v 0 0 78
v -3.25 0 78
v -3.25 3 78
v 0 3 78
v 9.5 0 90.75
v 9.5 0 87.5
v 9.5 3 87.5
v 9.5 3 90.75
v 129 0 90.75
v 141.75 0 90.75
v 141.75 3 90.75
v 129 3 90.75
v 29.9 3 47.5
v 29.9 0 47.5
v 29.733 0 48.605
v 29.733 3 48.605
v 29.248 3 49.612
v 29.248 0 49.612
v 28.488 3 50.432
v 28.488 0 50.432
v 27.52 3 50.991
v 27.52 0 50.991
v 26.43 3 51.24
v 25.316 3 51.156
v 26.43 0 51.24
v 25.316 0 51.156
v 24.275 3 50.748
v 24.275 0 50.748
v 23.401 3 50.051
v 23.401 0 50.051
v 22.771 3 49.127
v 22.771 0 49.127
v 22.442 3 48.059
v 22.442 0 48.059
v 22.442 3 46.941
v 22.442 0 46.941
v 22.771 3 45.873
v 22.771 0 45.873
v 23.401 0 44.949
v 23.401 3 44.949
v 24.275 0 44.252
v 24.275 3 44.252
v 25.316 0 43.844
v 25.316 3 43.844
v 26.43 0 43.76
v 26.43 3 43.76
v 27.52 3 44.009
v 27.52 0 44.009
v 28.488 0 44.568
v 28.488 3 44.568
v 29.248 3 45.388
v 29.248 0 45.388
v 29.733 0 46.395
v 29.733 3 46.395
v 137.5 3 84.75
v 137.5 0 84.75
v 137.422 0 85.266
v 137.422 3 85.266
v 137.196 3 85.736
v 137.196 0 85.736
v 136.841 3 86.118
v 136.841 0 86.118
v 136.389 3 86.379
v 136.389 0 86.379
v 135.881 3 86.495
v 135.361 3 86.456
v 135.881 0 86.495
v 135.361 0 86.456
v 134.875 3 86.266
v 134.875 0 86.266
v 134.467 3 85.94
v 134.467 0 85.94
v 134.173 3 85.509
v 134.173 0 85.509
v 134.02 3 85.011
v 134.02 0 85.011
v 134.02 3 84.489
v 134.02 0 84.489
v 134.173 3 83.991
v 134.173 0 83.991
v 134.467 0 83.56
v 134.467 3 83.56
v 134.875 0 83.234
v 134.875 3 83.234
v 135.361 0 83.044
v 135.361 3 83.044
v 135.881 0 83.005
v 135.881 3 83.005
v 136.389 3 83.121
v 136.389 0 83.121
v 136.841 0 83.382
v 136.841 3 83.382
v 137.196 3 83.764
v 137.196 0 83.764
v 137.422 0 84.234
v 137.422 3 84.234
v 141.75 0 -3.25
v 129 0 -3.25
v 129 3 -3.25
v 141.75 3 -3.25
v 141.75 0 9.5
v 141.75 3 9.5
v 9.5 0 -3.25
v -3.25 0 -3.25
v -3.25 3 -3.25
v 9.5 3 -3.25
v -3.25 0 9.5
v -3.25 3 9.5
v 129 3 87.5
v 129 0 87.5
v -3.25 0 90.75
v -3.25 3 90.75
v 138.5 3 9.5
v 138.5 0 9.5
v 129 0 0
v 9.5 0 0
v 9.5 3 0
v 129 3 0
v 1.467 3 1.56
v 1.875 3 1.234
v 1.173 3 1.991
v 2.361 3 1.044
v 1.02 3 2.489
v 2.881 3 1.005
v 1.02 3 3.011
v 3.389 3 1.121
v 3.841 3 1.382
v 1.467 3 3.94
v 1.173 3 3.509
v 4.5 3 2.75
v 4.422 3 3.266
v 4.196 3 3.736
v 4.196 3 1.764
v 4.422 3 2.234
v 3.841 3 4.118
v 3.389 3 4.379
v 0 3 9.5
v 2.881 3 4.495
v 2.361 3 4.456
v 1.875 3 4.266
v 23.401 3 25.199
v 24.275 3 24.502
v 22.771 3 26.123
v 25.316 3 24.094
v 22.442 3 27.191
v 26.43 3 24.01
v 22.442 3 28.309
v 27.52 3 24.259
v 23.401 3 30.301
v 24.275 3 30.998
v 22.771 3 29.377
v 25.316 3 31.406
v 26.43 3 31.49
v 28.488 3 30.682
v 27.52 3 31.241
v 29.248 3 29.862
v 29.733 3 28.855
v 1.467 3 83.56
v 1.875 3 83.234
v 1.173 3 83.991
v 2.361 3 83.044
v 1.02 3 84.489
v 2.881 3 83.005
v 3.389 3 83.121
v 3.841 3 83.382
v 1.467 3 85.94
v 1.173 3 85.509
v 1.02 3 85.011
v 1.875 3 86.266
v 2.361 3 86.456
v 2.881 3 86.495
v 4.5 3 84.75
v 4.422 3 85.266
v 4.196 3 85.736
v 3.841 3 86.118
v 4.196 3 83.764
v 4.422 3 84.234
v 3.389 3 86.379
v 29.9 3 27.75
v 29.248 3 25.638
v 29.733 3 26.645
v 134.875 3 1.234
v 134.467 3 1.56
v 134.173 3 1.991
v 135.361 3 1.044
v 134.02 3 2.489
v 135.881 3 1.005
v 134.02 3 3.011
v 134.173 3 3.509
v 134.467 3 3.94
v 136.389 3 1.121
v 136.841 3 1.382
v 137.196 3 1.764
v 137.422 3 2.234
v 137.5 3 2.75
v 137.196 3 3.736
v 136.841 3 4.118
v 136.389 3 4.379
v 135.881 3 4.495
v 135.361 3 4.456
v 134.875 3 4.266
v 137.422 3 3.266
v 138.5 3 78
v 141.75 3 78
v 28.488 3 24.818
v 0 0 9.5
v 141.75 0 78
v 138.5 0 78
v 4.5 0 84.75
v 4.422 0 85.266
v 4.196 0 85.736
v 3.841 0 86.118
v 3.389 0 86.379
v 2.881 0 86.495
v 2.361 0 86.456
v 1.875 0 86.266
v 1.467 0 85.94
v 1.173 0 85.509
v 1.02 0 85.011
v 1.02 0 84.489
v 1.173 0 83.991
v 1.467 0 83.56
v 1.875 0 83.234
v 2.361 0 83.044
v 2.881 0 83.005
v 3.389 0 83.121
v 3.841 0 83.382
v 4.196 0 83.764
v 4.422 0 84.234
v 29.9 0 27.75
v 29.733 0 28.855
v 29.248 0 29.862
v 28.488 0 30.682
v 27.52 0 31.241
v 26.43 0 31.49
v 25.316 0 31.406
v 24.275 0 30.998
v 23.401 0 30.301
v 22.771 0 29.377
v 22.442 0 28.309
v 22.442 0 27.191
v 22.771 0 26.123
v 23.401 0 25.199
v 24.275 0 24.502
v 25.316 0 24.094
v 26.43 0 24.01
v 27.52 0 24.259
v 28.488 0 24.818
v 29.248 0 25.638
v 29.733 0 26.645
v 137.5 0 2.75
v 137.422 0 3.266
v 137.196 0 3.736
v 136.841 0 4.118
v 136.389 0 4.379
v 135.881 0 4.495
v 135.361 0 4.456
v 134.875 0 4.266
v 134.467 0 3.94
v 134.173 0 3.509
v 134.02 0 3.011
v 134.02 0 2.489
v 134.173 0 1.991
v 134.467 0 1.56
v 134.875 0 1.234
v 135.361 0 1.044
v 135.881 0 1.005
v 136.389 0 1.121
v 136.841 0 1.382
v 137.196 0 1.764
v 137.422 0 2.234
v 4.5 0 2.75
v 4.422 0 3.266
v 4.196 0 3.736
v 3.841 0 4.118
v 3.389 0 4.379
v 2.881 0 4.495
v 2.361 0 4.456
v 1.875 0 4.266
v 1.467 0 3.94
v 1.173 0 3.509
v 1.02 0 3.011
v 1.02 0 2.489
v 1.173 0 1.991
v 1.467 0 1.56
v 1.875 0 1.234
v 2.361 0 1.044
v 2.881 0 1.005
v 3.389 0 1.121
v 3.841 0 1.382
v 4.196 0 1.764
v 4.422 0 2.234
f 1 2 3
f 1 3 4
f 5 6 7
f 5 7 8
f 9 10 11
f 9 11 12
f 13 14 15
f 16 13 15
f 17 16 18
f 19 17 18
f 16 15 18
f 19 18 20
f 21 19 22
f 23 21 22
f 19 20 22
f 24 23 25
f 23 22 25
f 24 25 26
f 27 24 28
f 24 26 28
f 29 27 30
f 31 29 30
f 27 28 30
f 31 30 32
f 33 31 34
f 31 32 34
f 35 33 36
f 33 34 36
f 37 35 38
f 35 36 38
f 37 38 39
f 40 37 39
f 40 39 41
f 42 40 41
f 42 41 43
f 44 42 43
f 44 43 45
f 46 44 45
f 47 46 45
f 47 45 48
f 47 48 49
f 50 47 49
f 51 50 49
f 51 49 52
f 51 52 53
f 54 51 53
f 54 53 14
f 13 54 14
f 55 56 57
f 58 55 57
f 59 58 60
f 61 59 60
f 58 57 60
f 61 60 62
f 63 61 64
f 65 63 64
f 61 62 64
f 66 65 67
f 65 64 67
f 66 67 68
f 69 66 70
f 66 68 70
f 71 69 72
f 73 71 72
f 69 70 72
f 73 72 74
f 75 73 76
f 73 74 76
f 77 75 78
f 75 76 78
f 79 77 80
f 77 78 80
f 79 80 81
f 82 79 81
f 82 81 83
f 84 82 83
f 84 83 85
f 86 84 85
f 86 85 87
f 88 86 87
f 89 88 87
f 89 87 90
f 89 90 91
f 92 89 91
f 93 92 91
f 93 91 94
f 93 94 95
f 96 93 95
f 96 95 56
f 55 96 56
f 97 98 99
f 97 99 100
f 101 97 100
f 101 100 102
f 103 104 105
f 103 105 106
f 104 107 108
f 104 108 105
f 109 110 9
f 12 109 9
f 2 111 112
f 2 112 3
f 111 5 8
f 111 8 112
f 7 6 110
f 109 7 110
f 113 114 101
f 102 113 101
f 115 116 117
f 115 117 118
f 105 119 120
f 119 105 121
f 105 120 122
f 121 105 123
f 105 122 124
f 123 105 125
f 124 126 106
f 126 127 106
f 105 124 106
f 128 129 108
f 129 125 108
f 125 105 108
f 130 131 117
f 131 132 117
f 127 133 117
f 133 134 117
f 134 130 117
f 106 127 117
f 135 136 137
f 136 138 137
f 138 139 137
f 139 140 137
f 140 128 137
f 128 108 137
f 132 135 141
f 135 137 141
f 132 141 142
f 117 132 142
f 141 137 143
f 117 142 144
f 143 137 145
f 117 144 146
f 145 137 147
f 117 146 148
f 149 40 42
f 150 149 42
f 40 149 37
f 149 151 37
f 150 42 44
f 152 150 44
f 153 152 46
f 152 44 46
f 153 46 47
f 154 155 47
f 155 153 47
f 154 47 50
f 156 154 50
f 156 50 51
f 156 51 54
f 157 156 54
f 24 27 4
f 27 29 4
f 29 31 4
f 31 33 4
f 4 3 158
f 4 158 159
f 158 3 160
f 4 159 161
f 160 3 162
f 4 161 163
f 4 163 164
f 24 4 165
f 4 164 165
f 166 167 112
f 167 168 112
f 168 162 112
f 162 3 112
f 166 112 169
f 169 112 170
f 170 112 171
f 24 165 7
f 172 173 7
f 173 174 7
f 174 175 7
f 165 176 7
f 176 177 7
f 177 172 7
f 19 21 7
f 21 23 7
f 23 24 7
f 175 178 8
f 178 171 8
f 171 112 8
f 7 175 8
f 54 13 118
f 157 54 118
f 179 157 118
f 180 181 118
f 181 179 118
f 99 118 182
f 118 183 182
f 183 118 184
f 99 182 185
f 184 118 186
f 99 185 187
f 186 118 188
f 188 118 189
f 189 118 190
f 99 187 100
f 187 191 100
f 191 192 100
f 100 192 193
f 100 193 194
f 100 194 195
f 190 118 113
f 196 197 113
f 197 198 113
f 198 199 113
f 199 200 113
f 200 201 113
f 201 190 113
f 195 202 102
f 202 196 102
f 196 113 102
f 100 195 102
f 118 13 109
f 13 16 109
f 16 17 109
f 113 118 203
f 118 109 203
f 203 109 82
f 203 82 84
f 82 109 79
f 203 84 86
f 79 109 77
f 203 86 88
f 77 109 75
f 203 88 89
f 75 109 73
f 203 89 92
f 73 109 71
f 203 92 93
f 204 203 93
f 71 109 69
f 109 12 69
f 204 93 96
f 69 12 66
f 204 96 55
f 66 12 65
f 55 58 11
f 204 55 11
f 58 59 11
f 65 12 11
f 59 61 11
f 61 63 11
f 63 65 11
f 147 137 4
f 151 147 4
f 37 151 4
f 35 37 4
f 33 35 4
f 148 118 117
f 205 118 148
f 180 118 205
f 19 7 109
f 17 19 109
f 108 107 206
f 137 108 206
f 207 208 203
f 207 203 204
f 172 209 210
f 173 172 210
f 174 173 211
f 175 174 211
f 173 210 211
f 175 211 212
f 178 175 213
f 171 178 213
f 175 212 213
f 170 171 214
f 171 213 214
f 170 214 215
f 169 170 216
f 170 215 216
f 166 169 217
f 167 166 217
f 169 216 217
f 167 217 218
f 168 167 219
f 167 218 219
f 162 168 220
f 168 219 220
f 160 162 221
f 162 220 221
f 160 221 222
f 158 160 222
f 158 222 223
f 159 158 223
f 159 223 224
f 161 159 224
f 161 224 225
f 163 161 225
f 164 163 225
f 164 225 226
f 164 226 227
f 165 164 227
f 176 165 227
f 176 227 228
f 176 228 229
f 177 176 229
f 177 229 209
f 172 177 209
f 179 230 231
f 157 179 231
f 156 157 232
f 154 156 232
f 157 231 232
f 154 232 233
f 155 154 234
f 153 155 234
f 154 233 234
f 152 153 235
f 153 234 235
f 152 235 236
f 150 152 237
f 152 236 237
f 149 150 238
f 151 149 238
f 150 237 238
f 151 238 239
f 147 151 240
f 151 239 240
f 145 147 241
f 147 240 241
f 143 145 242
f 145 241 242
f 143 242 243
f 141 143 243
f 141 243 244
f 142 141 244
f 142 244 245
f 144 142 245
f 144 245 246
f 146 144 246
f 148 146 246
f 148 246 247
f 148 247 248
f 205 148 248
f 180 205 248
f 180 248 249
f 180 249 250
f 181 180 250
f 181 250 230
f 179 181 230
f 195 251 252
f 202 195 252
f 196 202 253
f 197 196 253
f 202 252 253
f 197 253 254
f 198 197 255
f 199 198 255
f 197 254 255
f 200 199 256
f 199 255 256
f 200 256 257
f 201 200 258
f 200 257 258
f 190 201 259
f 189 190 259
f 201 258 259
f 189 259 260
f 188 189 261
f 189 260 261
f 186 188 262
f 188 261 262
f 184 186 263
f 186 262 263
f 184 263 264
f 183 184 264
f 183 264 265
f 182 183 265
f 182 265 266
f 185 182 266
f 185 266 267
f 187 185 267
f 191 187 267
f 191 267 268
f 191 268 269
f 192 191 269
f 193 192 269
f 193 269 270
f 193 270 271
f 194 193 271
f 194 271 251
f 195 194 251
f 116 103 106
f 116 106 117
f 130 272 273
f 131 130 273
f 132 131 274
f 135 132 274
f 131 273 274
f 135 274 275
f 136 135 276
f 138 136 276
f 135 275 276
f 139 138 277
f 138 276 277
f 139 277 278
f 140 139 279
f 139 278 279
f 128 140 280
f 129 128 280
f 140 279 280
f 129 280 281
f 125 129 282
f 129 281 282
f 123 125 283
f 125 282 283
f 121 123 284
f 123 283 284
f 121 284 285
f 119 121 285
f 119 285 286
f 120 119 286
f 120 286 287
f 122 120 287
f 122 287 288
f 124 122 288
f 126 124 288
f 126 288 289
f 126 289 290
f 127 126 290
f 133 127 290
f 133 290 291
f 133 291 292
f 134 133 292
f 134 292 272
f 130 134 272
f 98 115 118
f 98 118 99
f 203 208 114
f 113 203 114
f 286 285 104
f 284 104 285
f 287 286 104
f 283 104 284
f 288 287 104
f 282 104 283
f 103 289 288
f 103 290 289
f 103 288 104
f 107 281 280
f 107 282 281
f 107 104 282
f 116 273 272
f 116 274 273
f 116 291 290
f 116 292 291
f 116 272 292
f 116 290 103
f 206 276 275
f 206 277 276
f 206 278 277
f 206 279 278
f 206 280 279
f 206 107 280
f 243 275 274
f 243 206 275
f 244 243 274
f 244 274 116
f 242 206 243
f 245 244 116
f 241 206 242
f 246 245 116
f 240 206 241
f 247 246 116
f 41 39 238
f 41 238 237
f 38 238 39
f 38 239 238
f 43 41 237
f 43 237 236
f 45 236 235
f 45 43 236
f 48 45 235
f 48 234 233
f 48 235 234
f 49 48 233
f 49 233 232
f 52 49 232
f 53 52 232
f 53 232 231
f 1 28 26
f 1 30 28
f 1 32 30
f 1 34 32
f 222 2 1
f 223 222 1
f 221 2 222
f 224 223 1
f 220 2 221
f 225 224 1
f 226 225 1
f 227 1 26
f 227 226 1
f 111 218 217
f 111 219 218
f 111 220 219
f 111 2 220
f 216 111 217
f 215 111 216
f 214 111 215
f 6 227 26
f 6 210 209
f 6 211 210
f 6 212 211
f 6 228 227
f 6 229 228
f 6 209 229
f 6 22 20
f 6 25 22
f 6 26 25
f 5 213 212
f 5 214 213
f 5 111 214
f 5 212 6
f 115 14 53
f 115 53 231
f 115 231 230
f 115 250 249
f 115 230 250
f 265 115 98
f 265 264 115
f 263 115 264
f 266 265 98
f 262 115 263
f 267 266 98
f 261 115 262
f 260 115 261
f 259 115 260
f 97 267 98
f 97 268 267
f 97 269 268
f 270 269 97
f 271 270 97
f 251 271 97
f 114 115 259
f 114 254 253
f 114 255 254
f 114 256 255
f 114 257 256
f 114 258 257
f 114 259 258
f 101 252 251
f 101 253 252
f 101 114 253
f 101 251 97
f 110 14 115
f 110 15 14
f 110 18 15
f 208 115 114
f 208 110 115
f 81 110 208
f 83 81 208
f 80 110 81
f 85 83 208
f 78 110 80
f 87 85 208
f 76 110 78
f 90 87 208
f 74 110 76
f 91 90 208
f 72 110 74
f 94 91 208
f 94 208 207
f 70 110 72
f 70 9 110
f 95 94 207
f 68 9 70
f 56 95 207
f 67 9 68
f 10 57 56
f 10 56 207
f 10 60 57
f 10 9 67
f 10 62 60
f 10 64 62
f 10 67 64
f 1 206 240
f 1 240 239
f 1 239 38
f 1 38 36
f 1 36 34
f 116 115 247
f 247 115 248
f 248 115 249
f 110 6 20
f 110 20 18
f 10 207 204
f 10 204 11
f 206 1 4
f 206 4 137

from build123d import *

# Parameters (mm, degrees)
SKETCH1_W           = 138.5
SKETCH1_H           = 87.5
BOSS_EXTRUDE1_DEPTH = 3
SKETCH2_R           = 1.75
CUT_EXTRUDE1_DEPTH  = 4
SKETCH3_W           = 9.5
SKETCH3_H           = 3.25
SKETCH3_W_2         = 3.25
SKETCH3_H_2         = 9.5
BOSS_EXTRUDE2_DEPTH = 3
SKETCH4_R           = 3.75
CUT_EXTRUDE2_DEPTH  = 4


with BuildPart() as part:
    # Sketch1 → Boss-Extrude1 (new body)
    with BuildSketch(Plane(origin=(0, 0, 0), x_dir=(1, 0, 0), z_dir=(0, 1, 0))):
        with Locations((69.25, -43.75)):
            Rectangle(SKETCH1_W, SKETCH1_H)
    extrude(amount=BOSS_EXTRUDE1_DEPTH)

    # Sketch2 → Cut-Extrude1 (cut, through all)
    with BuildSketch(Plane.XZ):
        with Locations((2.75, 84.75)):
            Circle(SKETCH2_R)
        with Locations((135.75, 84.75)):
            Circle(SKETCH2_R)
        with Locations((135.75, 2.75)):
            Circle(SKETCH2_R)
        with Locations((2.75, 2.75)):
            Circle(SKETCH2_R)
    extrude(amount=-CUT_EXTRUDE1_DEPTH, mode=Mode.SUBTRACT)

    # Sketch3 → Boss-Extrude2 (add, through all)
    with BuildSketch(Plane.XZ):
        Polygon((0, 90.75), (-3.25, 90.75), (-3.25, 78), (0, 78), (0, 87.5), align=None)
        with Locations((4.75, 89.125)):
            Rectangle(SKETCH3_W, SKETCH3_H)
        with Locations((-1.625, 4.75)):
            Rectangle(SKETCH3_W_2, SKETCH3_H_2)
        Polygon((9.5, 0), (0, 0), (-3.25, 0), (-3.25, -3.25), (9.5, -3.25), align=None)
        Polygon((138.5, 0), (129, 0), (129, -3.25), (141.75, -3.25), (141.75, 0), align=None)
        with Locations((140.125, 4.75)):
            Rectangle(SKETCH3_W_2, SKETCH3_H_2)
        with Locations((133.75, 89.125)):
            Rectangle(SKETCH3_W, SKETCH3_H)
        Polygon((138.5, 90.75), (138.5, 87.5), (138.5, 78), (141.75, 78), (141.75, 90.75), align=None)
    extrude(amount=-BOSS_EXTRUDE2_DEPTH)

    # Sketch4 → Cut-Extrude2 (cut, through all)
    with BuildSketch(Plane.XZ):
        with Locations((26.15, 47.5)):
            Circle(SKETCH4_R)
        with Locations((26.15, 27.75)):
            Circle(SKETCH4_R)
    extrude(amount=-CUT_EXTRUDE2_DEPTH, mode=Mode.SUBTRACT)


solid = part.part
